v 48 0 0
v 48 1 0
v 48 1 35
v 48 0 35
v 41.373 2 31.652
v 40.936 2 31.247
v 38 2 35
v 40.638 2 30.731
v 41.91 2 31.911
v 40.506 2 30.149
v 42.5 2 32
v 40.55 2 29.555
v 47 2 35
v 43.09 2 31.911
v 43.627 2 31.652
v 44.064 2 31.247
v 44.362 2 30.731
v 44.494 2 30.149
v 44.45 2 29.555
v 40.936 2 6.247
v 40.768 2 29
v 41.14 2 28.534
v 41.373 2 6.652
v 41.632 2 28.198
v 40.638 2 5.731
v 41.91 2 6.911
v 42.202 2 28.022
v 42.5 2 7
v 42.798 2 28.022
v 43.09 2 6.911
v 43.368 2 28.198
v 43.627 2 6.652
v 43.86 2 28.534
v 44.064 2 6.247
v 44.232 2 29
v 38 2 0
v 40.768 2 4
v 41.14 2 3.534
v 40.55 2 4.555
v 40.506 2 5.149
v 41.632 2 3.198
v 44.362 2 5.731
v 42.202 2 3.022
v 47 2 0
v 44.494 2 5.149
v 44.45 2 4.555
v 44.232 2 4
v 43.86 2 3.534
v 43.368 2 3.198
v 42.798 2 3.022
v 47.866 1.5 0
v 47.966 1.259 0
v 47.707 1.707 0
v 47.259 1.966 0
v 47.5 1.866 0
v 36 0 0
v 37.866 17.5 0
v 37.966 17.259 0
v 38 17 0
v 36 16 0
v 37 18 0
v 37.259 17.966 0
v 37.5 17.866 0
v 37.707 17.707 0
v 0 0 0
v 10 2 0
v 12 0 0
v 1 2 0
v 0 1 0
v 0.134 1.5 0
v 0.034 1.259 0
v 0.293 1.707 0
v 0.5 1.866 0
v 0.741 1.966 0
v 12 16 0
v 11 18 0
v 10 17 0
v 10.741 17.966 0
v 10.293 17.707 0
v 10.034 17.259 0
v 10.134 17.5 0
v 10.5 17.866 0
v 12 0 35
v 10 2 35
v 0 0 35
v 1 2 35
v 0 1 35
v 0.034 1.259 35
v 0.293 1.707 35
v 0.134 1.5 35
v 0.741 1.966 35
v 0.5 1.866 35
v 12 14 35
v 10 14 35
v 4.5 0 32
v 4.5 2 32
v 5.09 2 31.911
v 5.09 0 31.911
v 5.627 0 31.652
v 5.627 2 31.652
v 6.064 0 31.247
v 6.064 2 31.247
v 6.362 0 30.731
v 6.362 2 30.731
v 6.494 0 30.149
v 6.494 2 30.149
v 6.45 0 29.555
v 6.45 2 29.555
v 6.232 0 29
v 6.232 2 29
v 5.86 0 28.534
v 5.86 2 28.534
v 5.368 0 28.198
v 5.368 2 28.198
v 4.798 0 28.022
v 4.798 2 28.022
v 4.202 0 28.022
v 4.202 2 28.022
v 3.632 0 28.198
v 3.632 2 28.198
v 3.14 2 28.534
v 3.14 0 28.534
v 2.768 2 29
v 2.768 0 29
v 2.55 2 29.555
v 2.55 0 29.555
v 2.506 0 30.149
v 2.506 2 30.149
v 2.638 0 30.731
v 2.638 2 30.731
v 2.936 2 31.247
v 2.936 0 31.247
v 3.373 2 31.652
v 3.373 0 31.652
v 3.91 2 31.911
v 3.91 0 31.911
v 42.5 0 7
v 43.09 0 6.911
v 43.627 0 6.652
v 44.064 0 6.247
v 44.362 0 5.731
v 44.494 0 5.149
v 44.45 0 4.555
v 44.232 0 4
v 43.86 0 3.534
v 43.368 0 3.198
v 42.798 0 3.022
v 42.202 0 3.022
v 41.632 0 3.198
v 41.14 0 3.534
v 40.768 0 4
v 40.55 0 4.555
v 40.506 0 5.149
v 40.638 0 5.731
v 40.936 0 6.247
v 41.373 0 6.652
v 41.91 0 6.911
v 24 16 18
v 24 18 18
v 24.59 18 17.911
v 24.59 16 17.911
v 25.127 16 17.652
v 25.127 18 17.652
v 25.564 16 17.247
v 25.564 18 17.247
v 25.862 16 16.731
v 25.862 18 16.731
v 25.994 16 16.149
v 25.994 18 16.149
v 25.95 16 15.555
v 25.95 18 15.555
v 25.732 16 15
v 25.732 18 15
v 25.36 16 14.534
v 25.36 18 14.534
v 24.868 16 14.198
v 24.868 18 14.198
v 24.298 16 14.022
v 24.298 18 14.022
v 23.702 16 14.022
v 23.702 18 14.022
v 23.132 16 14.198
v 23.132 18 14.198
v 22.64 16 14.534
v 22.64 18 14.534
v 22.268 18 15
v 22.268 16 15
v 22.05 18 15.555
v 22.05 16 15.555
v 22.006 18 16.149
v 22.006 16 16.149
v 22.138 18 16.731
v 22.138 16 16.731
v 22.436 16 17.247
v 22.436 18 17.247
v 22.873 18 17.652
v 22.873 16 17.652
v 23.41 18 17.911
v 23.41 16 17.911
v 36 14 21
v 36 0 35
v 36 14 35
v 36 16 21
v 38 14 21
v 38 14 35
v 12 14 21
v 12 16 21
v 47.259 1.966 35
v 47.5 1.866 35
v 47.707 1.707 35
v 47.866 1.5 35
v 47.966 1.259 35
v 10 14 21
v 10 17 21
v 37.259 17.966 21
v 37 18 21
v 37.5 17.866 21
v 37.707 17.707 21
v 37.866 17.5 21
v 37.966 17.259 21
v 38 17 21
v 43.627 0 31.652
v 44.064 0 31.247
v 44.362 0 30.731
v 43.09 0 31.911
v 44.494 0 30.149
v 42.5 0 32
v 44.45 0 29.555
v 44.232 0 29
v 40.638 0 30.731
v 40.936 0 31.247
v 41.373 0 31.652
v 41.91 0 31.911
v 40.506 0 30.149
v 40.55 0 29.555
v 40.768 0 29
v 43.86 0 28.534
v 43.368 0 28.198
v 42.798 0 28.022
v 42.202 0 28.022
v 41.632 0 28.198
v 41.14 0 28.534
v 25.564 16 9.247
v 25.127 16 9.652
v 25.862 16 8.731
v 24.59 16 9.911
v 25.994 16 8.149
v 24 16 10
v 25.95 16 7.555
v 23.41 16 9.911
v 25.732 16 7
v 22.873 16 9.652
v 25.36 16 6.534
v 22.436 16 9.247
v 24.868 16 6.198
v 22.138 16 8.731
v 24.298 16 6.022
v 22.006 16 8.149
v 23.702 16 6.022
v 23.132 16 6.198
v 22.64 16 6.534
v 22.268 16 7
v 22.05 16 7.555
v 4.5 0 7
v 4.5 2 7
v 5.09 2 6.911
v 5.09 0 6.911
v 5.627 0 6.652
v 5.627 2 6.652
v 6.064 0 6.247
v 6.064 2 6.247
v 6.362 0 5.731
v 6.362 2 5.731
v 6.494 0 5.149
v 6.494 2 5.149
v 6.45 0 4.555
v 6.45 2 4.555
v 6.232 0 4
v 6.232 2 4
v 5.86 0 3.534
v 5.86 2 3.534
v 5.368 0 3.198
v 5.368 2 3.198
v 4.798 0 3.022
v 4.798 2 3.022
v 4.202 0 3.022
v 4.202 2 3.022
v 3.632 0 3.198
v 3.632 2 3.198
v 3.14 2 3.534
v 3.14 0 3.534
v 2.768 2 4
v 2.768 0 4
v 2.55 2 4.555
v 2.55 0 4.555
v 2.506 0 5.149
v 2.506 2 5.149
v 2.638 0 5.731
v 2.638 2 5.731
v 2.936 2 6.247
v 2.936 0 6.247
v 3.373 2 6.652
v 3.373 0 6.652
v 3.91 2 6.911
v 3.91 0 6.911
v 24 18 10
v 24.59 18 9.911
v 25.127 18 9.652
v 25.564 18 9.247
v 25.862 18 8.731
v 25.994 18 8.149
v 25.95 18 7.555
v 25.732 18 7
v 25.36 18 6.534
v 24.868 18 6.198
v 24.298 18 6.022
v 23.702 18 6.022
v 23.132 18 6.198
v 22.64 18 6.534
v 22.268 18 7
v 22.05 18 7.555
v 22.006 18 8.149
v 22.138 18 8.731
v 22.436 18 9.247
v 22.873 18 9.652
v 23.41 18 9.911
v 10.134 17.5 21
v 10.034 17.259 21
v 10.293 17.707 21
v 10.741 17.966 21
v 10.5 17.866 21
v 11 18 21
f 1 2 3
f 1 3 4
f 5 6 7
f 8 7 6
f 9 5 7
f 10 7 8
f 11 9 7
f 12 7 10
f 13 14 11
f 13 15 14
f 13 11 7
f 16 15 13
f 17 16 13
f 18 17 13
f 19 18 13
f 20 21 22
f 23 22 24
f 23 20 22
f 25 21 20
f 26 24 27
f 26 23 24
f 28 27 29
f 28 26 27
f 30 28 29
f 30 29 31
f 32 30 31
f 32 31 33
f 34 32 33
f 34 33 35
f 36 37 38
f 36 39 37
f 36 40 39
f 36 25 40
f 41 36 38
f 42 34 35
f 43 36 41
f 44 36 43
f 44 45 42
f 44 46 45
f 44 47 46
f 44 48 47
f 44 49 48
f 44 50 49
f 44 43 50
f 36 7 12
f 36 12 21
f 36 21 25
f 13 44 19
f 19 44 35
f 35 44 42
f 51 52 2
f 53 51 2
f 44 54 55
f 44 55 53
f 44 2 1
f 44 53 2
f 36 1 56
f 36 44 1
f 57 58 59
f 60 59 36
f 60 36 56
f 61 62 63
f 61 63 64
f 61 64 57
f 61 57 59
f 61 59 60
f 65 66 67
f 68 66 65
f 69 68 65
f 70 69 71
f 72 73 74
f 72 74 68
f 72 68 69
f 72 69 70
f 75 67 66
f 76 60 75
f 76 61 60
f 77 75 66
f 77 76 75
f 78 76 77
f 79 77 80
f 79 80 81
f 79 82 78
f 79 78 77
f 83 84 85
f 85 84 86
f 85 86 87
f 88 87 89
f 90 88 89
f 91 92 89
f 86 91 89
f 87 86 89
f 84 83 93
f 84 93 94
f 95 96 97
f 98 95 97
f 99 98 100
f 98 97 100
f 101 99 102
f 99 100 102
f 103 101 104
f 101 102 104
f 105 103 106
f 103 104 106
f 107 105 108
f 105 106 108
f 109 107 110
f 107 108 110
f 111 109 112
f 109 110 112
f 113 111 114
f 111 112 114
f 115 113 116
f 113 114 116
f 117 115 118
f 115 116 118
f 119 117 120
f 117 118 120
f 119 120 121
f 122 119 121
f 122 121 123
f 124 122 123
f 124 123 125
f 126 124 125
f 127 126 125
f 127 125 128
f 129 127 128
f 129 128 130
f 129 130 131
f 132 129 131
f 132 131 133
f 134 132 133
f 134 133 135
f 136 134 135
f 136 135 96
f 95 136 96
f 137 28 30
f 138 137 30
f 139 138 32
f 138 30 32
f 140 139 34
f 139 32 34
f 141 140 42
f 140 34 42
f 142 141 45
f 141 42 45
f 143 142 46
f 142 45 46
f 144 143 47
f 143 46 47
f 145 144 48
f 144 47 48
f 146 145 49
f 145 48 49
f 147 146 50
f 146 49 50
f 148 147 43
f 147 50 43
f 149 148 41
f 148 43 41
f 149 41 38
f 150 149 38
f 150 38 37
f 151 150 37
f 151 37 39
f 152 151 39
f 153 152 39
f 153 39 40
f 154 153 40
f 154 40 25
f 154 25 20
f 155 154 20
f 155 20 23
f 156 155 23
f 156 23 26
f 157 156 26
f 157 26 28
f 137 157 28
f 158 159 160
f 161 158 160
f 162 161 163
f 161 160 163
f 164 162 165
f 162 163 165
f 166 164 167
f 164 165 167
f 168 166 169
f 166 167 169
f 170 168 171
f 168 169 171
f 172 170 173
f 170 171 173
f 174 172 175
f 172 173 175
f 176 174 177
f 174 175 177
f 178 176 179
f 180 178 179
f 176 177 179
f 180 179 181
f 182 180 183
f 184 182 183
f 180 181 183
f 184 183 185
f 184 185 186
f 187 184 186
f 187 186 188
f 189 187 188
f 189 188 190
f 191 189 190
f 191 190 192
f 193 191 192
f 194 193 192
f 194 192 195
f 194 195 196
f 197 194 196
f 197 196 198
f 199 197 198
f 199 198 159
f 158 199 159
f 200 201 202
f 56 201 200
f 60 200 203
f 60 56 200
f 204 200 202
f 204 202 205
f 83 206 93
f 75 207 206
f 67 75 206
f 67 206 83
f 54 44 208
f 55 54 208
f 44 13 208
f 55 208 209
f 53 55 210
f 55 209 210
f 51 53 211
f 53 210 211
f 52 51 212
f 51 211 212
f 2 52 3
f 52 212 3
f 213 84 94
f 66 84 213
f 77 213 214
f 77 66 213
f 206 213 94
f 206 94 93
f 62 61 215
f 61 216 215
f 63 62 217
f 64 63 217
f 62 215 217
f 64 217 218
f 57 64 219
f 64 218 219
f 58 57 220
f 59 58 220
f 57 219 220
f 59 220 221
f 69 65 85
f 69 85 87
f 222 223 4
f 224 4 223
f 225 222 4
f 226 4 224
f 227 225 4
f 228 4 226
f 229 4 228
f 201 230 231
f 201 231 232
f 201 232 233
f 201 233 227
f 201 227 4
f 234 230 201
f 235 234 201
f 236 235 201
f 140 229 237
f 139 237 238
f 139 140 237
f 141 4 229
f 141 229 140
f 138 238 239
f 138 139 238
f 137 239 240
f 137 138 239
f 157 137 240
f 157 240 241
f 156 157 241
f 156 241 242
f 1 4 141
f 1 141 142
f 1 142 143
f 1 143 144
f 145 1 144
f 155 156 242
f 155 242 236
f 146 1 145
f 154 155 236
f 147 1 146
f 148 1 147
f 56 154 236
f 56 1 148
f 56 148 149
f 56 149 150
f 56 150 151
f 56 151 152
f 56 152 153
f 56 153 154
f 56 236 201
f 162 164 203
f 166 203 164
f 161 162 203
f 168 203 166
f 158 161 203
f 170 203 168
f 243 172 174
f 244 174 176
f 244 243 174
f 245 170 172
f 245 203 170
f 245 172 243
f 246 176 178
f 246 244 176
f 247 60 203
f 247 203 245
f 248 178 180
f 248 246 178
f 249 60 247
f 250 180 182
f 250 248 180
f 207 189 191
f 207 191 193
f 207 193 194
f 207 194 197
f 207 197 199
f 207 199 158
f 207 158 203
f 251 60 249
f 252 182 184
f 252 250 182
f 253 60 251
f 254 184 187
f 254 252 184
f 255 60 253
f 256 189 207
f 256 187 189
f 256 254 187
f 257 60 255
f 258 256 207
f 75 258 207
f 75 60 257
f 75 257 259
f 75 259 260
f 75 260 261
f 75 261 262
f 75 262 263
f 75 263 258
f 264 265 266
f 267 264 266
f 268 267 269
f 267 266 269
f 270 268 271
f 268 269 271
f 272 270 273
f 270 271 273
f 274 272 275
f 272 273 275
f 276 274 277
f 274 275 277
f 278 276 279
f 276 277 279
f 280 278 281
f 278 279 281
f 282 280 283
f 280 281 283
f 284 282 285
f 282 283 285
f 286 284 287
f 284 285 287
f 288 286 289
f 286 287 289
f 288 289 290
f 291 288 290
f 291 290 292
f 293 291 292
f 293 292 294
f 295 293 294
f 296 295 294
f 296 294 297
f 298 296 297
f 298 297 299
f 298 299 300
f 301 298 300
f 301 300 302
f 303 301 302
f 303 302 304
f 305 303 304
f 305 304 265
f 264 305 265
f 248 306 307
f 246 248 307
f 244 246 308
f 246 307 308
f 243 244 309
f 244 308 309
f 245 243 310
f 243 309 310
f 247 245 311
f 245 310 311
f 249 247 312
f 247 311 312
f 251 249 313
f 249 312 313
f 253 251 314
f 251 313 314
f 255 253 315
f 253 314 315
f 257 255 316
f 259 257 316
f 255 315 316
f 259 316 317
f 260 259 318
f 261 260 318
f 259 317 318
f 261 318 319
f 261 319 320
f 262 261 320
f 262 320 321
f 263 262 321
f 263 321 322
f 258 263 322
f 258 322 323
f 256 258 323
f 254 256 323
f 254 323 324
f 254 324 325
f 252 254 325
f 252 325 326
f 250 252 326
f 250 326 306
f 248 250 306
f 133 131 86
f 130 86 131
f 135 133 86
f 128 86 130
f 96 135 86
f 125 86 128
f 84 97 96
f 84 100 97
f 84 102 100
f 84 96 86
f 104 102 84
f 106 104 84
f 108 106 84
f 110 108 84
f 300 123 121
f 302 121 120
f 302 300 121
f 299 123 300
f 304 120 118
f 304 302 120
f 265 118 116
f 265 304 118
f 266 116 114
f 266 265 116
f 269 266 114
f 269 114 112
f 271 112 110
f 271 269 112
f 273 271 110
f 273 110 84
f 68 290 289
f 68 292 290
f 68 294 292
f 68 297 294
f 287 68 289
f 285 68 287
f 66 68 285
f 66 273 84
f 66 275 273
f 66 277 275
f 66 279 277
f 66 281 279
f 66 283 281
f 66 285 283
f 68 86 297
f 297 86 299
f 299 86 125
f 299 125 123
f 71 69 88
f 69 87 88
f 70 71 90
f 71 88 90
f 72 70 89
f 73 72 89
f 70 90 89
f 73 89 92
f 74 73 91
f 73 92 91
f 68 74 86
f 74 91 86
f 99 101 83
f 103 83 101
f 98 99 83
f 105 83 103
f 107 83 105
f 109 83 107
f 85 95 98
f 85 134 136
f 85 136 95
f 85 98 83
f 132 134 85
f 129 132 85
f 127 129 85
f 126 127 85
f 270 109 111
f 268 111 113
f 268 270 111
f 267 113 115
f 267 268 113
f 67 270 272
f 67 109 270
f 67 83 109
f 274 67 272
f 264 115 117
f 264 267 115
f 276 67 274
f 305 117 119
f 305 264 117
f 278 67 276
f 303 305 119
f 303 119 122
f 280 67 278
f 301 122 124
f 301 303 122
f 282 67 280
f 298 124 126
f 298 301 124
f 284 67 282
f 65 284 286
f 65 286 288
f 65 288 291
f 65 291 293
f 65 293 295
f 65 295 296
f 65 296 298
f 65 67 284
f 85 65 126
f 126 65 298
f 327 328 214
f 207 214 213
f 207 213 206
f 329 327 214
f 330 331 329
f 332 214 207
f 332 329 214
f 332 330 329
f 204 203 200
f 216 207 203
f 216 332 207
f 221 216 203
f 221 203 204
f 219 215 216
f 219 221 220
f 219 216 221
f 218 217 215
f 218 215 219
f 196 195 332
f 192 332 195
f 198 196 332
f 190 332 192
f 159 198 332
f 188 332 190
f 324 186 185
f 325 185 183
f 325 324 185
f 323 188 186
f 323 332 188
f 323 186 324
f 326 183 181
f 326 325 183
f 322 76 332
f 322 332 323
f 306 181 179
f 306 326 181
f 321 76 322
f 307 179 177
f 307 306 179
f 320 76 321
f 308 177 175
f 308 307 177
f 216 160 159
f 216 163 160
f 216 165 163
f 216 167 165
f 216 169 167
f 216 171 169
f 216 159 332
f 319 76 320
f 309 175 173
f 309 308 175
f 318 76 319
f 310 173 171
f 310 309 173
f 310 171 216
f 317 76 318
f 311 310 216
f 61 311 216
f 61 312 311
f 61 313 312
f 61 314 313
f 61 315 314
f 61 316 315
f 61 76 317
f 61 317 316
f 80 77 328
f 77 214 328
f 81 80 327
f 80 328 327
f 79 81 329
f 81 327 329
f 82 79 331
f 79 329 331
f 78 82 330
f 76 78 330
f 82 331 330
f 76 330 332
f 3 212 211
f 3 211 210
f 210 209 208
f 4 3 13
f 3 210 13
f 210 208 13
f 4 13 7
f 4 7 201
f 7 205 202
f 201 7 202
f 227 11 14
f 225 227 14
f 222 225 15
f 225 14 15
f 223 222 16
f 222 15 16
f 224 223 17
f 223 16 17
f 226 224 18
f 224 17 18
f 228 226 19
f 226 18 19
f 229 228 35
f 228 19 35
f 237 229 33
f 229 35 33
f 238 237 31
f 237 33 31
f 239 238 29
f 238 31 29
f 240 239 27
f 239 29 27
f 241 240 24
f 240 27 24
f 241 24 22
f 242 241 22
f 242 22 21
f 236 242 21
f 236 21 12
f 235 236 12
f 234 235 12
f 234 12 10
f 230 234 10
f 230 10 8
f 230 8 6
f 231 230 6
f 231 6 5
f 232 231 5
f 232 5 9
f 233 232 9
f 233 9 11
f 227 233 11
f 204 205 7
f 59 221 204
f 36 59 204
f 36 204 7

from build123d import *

# Parameters (mm, degrees)
BOSS_EXTRUDE1_DEPTH = 35
SKETCH3_W           = 28
SKETCH3_H           = 14
CUT_EXTRUDE1_DEPTH  = 4
FILLET1_R           = 1
SKETCH4_R           = 2
CUT_EXTRUDE2_DEPTH  = 63.072538211


with BuildPart() as part:
    # Sketch2 → Boss-Extrude1 (new body)
    with BuildSketch(Plane.XY):
        Polygon((0, 0), (0, 2), (10, 2), (10, 18), (38, 18), (38, 2), (48, 2), (48, 0), (36, 0), (36, 16), (12, 16), (12, 0), align=None)
    extrude(amount=BOSS_EXTRUDE1_DEPTH)

    # Sketch3 → Cut-Extrude1 (cut)
    with BuildSketch(Plane(origin=(0, 18, 0), x_dir=(1, 0, 0), z_dir=(0, 1, 0))):
        with Locations((24, -28)):
            Rectangle(SKETCH3_W, SKETCH3_H)
    extrude(amount=-CUT_EXTRUDE1_DEPTH, mode=Mode.SUBTRACT)

    # Fillet1
    fillet1_edges = [part.edges().sort_by_distance(p)[0] for p in [
        (0, 2, 17.5),
        (48, 2, 17.5),
        (10, 18, 10.5),
        (38, 18, 10.5),
    ]]
    fillet(fillet1_edges, radius=FILLET1_R)

    # Sketch4 → Cut-Extrude2 (cut, through all)
    with BuildSketch(Plane(origin=(0, 18, 0), x_dir=(1, 0, 0), z_dir=(0, 1, 0))):
        with Locations(Location((24, -8, 0), (0, 0, 270))):
            Circle(SKETCH4_R)
        with Locations(Location((24, -16, 0), (0, 0, 270))):
            Circle(SKETCH4_R)
        with Locations(Location((42.5, -5, 0), (0, 0, 270))):
            Circle(SKETCH4_R)
        with Locations(Location((42.5, -30, 0), (0, 0, 270))):
            Circle(SKETCH4_R)
        with Locations(Location((4.5, -5, 0), (0, 0, 270))):
            Circle(SKETCH4_R)
        with Locations(Location((4.5, -30, 0), (0, 0, 270))):
            Circle(SKETCH4_R)
    extrude(amount=-CUT_EXTRUDE2_DEPTH, mode=Mode.SUBTRACT)


solid = part.part
